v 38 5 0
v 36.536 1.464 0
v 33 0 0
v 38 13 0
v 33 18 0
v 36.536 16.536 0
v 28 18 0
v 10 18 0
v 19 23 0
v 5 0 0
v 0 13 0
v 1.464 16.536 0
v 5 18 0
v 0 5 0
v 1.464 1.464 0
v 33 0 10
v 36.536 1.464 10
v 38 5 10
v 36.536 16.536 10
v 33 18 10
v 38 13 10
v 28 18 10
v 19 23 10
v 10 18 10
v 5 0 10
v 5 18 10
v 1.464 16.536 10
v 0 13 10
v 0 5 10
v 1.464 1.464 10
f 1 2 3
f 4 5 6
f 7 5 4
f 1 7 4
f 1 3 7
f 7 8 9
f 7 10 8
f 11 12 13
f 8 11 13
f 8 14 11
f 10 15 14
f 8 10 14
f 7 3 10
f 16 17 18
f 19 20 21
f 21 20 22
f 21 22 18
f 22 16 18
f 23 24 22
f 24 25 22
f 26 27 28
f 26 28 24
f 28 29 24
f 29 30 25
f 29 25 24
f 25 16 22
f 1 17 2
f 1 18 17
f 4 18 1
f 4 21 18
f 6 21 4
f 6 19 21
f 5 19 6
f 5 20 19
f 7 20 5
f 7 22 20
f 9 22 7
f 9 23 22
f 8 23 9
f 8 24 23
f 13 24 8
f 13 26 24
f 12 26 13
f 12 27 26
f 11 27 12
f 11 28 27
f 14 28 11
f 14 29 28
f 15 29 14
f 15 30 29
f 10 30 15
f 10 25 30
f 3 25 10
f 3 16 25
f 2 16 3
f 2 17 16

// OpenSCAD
$fn = 32;

// ----------------------------------------------------------------------
// Ratchet pawl: 38 x 18 mm body, beak 5 mm сверху
// ----------------------------------------------------------------------

// --- parameters (mm) ---
profile_height = 10;      // extrusion height
profile_points = 15;      // points of the closed outline

profile = [[0, 5], [1.464, 1.464], [5, 0], [33, 0], [36.536, 1.464], [38, 5], [38, 13], [36.536, 16.536], [33, 18], [28, 18], [19, 23], [10, 18], [5, 18], [1.464, 16.536], [0, 13]];  // single closed polygon, 15 points, counter clockwise

// --- the one profile operation ---
linear_extrude(height = profile_height) polygon(points = profile);
